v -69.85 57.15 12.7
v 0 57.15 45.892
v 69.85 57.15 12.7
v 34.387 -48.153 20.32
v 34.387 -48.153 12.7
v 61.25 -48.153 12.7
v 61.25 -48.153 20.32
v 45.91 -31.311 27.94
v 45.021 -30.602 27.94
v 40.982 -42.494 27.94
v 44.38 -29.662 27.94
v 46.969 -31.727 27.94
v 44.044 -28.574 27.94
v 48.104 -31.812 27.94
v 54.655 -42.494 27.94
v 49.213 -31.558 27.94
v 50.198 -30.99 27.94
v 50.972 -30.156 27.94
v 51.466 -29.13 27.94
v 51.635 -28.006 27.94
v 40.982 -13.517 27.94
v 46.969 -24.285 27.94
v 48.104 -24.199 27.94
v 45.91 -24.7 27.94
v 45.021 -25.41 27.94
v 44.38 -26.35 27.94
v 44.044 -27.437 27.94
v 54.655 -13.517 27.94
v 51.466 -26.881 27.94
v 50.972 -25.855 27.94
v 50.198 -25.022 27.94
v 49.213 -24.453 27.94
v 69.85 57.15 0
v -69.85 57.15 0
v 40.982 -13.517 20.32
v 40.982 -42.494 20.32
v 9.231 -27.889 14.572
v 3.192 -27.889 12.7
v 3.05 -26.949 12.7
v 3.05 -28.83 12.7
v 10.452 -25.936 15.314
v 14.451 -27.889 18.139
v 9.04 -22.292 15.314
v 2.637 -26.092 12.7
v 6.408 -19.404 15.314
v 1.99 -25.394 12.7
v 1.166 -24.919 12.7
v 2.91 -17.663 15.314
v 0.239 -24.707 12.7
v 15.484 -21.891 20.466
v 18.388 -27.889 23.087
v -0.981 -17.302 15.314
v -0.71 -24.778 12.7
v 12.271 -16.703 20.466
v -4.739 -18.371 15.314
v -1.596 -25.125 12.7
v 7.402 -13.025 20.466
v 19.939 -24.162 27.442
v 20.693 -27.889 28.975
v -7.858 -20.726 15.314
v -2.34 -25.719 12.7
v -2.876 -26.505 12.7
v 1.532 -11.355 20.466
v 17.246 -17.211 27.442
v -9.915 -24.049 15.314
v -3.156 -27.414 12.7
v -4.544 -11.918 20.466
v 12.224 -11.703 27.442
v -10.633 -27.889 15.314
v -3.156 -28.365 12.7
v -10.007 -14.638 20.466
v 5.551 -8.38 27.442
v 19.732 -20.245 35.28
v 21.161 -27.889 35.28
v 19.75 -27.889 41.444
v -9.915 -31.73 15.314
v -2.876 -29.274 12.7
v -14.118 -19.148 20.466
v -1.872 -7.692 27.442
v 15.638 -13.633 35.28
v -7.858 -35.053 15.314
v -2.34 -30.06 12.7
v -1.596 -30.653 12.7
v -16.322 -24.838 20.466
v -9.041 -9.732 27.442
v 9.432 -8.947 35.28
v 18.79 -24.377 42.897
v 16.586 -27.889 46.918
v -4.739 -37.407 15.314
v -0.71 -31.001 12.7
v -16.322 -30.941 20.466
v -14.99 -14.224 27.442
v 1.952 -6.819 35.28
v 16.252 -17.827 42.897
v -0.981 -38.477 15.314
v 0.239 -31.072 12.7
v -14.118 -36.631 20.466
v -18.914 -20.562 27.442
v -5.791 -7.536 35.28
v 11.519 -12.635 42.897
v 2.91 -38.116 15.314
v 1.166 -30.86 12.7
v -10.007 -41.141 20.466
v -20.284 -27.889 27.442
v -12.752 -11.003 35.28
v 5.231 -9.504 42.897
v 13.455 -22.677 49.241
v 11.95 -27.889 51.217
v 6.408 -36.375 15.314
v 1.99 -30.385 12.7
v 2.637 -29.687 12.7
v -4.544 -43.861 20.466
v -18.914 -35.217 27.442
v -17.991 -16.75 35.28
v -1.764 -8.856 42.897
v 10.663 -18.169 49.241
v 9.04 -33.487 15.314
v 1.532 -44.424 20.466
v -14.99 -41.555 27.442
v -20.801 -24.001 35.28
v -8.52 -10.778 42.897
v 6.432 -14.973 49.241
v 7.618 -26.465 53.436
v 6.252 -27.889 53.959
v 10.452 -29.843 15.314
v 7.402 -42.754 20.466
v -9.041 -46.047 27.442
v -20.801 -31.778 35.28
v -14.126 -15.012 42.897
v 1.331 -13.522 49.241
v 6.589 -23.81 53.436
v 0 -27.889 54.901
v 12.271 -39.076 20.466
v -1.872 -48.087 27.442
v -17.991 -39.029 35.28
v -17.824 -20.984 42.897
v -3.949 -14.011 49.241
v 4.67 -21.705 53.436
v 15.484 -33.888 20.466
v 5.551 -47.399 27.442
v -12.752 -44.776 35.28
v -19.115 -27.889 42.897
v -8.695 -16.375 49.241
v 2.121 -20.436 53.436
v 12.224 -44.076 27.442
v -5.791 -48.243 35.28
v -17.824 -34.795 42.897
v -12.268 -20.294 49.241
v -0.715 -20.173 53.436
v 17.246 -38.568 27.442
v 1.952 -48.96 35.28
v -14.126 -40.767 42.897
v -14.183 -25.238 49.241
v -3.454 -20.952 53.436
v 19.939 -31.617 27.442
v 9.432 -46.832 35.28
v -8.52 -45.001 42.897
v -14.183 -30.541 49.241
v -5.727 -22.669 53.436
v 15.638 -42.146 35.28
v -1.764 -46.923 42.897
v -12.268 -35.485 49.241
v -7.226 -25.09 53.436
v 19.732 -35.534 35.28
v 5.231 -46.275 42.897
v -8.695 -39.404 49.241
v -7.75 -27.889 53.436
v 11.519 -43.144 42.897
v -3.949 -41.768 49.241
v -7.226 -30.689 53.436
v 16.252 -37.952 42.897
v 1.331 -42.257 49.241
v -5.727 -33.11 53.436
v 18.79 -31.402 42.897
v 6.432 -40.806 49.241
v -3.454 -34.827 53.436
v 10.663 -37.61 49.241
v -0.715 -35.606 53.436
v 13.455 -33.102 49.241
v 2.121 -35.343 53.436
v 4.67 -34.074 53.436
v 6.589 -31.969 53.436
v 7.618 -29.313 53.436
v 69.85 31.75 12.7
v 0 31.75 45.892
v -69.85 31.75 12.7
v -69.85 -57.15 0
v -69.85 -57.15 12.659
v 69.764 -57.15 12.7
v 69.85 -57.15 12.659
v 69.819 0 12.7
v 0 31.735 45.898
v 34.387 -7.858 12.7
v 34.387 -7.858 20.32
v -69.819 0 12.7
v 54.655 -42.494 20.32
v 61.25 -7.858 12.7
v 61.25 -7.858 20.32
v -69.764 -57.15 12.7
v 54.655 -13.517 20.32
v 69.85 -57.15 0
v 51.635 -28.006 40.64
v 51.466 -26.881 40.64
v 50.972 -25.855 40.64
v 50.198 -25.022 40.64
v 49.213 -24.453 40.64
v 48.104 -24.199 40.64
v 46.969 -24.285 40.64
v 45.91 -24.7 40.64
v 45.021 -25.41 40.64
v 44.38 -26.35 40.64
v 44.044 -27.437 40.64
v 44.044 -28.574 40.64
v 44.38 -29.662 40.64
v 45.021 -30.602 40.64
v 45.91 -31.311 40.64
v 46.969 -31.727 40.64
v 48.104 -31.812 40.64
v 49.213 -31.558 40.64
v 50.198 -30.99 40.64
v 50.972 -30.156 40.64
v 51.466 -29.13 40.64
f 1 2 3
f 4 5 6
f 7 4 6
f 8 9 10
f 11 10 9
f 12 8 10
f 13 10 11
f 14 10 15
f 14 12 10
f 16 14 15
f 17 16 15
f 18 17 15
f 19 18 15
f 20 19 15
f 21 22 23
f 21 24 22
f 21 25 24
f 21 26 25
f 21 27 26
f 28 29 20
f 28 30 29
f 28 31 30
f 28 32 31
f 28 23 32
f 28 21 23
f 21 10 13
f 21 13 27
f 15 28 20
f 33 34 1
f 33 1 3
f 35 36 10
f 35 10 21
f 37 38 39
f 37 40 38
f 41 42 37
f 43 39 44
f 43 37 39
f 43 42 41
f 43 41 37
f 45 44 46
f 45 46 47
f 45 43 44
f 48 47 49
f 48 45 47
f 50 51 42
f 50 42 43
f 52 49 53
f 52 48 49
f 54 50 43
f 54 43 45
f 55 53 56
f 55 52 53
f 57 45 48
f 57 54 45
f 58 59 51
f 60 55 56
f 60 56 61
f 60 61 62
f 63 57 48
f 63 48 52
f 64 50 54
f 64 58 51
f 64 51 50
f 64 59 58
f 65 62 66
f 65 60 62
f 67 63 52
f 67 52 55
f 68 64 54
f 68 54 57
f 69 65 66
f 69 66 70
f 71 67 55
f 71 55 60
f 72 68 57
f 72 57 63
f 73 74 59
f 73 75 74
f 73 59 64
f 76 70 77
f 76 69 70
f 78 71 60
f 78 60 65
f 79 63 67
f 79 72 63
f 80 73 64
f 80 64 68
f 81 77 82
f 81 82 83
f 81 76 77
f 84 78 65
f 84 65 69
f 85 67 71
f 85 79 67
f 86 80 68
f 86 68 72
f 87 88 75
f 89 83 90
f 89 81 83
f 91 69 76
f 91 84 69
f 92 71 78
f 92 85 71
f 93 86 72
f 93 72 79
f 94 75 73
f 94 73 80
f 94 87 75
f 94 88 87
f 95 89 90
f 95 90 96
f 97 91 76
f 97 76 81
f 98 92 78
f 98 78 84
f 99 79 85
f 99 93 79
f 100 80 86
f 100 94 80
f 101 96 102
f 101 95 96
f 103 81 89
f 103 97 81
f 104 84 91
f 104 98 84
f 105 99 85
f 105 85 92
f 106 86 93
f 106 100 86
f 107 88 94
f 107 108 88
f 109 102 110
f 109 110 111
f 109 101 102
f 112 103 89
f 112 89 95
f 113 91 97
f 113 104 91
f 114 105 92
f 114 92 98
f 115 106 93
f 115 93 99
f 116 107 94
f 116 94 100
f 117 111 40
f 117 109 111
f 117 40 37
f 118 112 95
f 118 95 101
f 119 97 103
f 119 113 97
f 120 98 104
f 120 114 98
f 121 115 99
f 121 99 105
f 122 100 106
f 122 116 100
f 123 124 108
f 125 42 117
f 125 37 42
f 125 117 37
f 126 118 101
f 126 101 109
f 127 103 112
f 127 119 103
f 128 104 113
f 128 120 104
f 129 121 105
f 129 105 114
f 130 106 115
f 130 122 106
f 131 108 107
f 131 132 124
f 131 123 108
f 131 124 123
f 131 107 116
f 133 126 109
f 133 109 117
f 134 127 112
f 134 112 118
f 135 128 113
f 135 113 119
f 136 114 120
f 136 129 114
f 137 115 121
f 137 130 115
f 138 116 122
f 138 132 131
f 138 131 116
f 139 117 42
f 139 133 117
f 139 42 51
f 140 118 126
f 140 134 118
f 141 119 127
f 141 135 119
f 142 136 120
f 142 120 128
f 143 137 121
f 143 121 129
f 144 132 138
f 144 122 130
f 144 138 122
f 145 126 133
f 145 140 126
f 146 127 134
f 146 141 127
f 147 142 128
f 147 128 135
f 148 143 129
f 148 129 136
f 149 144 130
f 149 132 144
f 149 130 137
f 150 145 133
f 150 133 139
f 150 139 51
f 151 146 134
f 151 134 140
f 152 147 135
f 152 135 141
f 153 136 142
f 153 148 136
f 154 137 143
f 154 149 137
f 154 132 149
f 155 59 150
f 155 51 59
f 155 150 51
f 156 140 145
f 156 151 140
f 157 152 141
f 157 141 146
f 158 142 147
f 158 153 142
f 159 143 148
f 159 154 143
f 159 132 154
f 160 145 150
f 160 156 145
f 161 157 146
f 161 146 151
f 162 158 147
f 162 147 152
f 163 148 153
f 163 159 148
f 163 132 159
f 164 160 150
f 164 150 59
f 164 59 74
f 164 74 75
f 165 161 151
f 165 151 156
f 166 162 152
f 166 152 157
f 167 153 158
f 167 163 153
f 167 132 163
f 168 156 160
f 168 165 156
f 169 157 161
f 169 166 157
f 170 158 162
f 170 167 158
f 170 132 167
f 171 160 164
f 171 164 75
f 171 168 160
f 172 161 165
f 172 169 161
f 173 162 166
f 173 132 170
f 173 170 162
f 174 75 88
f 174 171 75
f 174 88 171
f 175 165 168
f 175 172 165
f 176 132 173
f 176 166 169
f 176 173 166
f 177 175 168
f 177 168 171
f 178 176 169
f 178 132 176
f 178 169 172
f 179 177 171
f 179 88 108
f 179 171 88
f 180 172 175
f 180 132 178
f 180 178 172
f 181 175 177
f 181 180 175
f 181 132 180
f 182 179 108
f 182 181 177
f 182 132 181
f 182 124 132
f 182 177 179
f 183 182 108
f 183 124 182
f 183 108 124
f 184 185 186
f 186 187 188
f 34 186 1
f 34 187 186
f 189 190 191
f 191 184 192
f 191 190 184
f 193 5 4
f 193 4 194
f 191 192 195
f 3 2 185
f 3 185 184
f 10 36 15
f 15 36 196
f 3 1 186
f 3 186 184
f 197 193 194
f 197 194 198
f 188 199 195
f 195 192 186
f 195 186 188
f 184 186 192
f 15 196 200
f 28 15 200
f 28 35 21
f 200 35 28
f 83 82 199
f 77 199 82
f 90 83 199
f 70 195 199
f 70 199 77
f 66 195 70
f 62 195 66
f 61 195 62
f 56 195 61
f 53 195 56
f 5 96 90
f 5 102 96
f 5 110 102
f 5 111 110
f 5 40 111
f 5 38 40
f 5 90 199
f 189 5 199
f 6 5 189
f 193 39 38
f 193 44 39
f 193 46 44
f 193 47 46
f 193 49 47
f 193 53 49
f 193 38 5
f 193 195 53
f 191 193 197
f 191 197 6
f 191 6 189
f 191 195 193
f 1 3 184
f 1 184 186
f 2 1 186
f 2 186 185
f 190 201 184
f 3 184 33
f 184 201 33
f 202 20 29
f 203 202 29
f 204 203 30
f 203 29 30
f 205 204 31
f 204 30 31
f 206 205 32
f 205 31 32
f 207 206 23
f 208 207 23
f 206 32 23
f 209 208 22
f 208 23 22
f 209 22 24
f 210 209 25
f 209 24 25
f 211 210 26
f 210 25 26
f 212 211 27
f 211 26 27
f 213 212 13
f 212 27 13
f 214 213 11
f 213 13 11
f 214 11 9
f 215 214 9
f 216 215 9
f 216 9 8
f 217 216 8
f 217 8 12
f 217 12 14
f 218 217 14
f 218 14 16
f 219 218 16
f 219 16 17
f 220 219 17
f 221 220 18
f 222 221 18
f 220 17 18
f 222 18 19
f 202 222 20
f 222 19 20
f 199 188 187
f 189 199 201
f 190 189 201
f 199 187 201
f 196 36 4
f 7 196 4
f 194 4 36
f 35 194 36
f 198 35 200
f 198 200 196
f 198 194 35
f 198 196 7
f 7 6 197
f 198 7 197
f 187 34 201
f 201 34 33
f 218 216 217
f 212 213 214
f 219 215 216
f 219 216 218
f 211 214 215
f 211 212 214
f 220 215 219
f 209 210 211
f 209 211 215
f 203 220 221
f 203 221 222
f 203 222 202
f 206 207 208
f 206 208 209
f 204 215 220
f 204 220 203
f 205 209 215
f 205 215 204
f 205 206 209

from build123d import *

# Parameters (mm, degrees)
F0_W      = 139.7
F0_H      = 114.3
F1_DEPTH  = 12.7
F3_DEPTH  = 25.4
F5_DEPTH  = 69.85
F7_DEPTH  = 152.4
F12_W     = 26.8636792898
F12_H     = 40.2955412865
F13_DEPTH = 7.62
F14_W     = 13.6722624302
F14_H     = 28.9779752493
F15_DEPTH = 7.62
F16_R     = 3.8166863586
F17_DEPTH = 12.7


with BuildPart() as f1:
    # F0 (on Top) → F1 (new body)
    with BuildSketch(Plane.XY):
        Rectangle(F0_W, F0_H)
    extrude(amount=F1_DEPTH)

    # F4 (on Right) → F5 (join, symmetric)
    with BuildSketch(Plane.YZ):
        Polygon((31.7347206713, 45.8977964838), (0, 12.7), (31.75, 12.7), align=None)
    extrude(amount=F5_DEPTH, both=True)

    # F6 (on face) → F7 (cut)
    with BuildSketch(Plane(origin=(0, 31.7558384645, 0.0146156657), x_dir=(-1, 0, 0), z_dir=(0, 0.9999998941, 0.0004602512))):
        Polygon((-69.85, 45.8831856779), (-69.85, 12.6853856779), (0, 45.8831856779), align=None)
        Polygon((69.85, 45.8831856779), (0, 45.8831856779), (69.85, 12.6853856779), align=None)
    extrude(amount=-F7_DEPTH, mode=Mode.SUBTRACT)

    # F9 (on offset) → F11 (revolve)
    with BuildSketch(Plane.XZ.offset(27.8894752264)):
        with BuildLine():
            Line((0, 54.9014345332), (0, 12.4586313442))
            ThreePointArc((0, 12.4586313442), (21.2214015945, 33.6800329387), (0, 54.9014345332))
        make_face()
    revolve(axis=Axis((0, -27.8894752264, 30.9769287705), (0, 0, 1)))

    # F12 (on face) → F13 (join)
    with BuildSketch(Plane.XY.offset(12.7)):
        with Locations((47.8184521198, -28.0055105686)):
            Rectangle(F12_W, F12_H)
    extrude(amount=F13_DEPTH)

    # F14 (on face) → F15 (join)
    with BuildSketch(Plane.XY.offset(20.32)):
        with Locations((47.8184521198, -28.0055105686)):
            Rectangle(F14_W, F14_H)
    extrude(amount=F15_DEPTH)

    # F16 (on face) → F17 (join)
    with BuildSketch(Plane.XY.offset(27.94)):
        with Locations((47.8184521198, -28.0055105686)):
            Circle(F16_R)
    extrude(amount=F17_DEPTH)


with BuildPart() as f3:
    # F2 (on face) → F3 (new body)
    with BuildSketch(Plane(origin=(0, 57.15, 0), x_dir=(-1, 0, 0), z_dir=(0, 1, 0))):
        Polygon((-69.85, 12.7), (69.85, 12.7), (0, 45.8916760981), align=None)
    extrude(amount=-F3_DEPTH)


solid = Compound([f1.part, f3.part])
